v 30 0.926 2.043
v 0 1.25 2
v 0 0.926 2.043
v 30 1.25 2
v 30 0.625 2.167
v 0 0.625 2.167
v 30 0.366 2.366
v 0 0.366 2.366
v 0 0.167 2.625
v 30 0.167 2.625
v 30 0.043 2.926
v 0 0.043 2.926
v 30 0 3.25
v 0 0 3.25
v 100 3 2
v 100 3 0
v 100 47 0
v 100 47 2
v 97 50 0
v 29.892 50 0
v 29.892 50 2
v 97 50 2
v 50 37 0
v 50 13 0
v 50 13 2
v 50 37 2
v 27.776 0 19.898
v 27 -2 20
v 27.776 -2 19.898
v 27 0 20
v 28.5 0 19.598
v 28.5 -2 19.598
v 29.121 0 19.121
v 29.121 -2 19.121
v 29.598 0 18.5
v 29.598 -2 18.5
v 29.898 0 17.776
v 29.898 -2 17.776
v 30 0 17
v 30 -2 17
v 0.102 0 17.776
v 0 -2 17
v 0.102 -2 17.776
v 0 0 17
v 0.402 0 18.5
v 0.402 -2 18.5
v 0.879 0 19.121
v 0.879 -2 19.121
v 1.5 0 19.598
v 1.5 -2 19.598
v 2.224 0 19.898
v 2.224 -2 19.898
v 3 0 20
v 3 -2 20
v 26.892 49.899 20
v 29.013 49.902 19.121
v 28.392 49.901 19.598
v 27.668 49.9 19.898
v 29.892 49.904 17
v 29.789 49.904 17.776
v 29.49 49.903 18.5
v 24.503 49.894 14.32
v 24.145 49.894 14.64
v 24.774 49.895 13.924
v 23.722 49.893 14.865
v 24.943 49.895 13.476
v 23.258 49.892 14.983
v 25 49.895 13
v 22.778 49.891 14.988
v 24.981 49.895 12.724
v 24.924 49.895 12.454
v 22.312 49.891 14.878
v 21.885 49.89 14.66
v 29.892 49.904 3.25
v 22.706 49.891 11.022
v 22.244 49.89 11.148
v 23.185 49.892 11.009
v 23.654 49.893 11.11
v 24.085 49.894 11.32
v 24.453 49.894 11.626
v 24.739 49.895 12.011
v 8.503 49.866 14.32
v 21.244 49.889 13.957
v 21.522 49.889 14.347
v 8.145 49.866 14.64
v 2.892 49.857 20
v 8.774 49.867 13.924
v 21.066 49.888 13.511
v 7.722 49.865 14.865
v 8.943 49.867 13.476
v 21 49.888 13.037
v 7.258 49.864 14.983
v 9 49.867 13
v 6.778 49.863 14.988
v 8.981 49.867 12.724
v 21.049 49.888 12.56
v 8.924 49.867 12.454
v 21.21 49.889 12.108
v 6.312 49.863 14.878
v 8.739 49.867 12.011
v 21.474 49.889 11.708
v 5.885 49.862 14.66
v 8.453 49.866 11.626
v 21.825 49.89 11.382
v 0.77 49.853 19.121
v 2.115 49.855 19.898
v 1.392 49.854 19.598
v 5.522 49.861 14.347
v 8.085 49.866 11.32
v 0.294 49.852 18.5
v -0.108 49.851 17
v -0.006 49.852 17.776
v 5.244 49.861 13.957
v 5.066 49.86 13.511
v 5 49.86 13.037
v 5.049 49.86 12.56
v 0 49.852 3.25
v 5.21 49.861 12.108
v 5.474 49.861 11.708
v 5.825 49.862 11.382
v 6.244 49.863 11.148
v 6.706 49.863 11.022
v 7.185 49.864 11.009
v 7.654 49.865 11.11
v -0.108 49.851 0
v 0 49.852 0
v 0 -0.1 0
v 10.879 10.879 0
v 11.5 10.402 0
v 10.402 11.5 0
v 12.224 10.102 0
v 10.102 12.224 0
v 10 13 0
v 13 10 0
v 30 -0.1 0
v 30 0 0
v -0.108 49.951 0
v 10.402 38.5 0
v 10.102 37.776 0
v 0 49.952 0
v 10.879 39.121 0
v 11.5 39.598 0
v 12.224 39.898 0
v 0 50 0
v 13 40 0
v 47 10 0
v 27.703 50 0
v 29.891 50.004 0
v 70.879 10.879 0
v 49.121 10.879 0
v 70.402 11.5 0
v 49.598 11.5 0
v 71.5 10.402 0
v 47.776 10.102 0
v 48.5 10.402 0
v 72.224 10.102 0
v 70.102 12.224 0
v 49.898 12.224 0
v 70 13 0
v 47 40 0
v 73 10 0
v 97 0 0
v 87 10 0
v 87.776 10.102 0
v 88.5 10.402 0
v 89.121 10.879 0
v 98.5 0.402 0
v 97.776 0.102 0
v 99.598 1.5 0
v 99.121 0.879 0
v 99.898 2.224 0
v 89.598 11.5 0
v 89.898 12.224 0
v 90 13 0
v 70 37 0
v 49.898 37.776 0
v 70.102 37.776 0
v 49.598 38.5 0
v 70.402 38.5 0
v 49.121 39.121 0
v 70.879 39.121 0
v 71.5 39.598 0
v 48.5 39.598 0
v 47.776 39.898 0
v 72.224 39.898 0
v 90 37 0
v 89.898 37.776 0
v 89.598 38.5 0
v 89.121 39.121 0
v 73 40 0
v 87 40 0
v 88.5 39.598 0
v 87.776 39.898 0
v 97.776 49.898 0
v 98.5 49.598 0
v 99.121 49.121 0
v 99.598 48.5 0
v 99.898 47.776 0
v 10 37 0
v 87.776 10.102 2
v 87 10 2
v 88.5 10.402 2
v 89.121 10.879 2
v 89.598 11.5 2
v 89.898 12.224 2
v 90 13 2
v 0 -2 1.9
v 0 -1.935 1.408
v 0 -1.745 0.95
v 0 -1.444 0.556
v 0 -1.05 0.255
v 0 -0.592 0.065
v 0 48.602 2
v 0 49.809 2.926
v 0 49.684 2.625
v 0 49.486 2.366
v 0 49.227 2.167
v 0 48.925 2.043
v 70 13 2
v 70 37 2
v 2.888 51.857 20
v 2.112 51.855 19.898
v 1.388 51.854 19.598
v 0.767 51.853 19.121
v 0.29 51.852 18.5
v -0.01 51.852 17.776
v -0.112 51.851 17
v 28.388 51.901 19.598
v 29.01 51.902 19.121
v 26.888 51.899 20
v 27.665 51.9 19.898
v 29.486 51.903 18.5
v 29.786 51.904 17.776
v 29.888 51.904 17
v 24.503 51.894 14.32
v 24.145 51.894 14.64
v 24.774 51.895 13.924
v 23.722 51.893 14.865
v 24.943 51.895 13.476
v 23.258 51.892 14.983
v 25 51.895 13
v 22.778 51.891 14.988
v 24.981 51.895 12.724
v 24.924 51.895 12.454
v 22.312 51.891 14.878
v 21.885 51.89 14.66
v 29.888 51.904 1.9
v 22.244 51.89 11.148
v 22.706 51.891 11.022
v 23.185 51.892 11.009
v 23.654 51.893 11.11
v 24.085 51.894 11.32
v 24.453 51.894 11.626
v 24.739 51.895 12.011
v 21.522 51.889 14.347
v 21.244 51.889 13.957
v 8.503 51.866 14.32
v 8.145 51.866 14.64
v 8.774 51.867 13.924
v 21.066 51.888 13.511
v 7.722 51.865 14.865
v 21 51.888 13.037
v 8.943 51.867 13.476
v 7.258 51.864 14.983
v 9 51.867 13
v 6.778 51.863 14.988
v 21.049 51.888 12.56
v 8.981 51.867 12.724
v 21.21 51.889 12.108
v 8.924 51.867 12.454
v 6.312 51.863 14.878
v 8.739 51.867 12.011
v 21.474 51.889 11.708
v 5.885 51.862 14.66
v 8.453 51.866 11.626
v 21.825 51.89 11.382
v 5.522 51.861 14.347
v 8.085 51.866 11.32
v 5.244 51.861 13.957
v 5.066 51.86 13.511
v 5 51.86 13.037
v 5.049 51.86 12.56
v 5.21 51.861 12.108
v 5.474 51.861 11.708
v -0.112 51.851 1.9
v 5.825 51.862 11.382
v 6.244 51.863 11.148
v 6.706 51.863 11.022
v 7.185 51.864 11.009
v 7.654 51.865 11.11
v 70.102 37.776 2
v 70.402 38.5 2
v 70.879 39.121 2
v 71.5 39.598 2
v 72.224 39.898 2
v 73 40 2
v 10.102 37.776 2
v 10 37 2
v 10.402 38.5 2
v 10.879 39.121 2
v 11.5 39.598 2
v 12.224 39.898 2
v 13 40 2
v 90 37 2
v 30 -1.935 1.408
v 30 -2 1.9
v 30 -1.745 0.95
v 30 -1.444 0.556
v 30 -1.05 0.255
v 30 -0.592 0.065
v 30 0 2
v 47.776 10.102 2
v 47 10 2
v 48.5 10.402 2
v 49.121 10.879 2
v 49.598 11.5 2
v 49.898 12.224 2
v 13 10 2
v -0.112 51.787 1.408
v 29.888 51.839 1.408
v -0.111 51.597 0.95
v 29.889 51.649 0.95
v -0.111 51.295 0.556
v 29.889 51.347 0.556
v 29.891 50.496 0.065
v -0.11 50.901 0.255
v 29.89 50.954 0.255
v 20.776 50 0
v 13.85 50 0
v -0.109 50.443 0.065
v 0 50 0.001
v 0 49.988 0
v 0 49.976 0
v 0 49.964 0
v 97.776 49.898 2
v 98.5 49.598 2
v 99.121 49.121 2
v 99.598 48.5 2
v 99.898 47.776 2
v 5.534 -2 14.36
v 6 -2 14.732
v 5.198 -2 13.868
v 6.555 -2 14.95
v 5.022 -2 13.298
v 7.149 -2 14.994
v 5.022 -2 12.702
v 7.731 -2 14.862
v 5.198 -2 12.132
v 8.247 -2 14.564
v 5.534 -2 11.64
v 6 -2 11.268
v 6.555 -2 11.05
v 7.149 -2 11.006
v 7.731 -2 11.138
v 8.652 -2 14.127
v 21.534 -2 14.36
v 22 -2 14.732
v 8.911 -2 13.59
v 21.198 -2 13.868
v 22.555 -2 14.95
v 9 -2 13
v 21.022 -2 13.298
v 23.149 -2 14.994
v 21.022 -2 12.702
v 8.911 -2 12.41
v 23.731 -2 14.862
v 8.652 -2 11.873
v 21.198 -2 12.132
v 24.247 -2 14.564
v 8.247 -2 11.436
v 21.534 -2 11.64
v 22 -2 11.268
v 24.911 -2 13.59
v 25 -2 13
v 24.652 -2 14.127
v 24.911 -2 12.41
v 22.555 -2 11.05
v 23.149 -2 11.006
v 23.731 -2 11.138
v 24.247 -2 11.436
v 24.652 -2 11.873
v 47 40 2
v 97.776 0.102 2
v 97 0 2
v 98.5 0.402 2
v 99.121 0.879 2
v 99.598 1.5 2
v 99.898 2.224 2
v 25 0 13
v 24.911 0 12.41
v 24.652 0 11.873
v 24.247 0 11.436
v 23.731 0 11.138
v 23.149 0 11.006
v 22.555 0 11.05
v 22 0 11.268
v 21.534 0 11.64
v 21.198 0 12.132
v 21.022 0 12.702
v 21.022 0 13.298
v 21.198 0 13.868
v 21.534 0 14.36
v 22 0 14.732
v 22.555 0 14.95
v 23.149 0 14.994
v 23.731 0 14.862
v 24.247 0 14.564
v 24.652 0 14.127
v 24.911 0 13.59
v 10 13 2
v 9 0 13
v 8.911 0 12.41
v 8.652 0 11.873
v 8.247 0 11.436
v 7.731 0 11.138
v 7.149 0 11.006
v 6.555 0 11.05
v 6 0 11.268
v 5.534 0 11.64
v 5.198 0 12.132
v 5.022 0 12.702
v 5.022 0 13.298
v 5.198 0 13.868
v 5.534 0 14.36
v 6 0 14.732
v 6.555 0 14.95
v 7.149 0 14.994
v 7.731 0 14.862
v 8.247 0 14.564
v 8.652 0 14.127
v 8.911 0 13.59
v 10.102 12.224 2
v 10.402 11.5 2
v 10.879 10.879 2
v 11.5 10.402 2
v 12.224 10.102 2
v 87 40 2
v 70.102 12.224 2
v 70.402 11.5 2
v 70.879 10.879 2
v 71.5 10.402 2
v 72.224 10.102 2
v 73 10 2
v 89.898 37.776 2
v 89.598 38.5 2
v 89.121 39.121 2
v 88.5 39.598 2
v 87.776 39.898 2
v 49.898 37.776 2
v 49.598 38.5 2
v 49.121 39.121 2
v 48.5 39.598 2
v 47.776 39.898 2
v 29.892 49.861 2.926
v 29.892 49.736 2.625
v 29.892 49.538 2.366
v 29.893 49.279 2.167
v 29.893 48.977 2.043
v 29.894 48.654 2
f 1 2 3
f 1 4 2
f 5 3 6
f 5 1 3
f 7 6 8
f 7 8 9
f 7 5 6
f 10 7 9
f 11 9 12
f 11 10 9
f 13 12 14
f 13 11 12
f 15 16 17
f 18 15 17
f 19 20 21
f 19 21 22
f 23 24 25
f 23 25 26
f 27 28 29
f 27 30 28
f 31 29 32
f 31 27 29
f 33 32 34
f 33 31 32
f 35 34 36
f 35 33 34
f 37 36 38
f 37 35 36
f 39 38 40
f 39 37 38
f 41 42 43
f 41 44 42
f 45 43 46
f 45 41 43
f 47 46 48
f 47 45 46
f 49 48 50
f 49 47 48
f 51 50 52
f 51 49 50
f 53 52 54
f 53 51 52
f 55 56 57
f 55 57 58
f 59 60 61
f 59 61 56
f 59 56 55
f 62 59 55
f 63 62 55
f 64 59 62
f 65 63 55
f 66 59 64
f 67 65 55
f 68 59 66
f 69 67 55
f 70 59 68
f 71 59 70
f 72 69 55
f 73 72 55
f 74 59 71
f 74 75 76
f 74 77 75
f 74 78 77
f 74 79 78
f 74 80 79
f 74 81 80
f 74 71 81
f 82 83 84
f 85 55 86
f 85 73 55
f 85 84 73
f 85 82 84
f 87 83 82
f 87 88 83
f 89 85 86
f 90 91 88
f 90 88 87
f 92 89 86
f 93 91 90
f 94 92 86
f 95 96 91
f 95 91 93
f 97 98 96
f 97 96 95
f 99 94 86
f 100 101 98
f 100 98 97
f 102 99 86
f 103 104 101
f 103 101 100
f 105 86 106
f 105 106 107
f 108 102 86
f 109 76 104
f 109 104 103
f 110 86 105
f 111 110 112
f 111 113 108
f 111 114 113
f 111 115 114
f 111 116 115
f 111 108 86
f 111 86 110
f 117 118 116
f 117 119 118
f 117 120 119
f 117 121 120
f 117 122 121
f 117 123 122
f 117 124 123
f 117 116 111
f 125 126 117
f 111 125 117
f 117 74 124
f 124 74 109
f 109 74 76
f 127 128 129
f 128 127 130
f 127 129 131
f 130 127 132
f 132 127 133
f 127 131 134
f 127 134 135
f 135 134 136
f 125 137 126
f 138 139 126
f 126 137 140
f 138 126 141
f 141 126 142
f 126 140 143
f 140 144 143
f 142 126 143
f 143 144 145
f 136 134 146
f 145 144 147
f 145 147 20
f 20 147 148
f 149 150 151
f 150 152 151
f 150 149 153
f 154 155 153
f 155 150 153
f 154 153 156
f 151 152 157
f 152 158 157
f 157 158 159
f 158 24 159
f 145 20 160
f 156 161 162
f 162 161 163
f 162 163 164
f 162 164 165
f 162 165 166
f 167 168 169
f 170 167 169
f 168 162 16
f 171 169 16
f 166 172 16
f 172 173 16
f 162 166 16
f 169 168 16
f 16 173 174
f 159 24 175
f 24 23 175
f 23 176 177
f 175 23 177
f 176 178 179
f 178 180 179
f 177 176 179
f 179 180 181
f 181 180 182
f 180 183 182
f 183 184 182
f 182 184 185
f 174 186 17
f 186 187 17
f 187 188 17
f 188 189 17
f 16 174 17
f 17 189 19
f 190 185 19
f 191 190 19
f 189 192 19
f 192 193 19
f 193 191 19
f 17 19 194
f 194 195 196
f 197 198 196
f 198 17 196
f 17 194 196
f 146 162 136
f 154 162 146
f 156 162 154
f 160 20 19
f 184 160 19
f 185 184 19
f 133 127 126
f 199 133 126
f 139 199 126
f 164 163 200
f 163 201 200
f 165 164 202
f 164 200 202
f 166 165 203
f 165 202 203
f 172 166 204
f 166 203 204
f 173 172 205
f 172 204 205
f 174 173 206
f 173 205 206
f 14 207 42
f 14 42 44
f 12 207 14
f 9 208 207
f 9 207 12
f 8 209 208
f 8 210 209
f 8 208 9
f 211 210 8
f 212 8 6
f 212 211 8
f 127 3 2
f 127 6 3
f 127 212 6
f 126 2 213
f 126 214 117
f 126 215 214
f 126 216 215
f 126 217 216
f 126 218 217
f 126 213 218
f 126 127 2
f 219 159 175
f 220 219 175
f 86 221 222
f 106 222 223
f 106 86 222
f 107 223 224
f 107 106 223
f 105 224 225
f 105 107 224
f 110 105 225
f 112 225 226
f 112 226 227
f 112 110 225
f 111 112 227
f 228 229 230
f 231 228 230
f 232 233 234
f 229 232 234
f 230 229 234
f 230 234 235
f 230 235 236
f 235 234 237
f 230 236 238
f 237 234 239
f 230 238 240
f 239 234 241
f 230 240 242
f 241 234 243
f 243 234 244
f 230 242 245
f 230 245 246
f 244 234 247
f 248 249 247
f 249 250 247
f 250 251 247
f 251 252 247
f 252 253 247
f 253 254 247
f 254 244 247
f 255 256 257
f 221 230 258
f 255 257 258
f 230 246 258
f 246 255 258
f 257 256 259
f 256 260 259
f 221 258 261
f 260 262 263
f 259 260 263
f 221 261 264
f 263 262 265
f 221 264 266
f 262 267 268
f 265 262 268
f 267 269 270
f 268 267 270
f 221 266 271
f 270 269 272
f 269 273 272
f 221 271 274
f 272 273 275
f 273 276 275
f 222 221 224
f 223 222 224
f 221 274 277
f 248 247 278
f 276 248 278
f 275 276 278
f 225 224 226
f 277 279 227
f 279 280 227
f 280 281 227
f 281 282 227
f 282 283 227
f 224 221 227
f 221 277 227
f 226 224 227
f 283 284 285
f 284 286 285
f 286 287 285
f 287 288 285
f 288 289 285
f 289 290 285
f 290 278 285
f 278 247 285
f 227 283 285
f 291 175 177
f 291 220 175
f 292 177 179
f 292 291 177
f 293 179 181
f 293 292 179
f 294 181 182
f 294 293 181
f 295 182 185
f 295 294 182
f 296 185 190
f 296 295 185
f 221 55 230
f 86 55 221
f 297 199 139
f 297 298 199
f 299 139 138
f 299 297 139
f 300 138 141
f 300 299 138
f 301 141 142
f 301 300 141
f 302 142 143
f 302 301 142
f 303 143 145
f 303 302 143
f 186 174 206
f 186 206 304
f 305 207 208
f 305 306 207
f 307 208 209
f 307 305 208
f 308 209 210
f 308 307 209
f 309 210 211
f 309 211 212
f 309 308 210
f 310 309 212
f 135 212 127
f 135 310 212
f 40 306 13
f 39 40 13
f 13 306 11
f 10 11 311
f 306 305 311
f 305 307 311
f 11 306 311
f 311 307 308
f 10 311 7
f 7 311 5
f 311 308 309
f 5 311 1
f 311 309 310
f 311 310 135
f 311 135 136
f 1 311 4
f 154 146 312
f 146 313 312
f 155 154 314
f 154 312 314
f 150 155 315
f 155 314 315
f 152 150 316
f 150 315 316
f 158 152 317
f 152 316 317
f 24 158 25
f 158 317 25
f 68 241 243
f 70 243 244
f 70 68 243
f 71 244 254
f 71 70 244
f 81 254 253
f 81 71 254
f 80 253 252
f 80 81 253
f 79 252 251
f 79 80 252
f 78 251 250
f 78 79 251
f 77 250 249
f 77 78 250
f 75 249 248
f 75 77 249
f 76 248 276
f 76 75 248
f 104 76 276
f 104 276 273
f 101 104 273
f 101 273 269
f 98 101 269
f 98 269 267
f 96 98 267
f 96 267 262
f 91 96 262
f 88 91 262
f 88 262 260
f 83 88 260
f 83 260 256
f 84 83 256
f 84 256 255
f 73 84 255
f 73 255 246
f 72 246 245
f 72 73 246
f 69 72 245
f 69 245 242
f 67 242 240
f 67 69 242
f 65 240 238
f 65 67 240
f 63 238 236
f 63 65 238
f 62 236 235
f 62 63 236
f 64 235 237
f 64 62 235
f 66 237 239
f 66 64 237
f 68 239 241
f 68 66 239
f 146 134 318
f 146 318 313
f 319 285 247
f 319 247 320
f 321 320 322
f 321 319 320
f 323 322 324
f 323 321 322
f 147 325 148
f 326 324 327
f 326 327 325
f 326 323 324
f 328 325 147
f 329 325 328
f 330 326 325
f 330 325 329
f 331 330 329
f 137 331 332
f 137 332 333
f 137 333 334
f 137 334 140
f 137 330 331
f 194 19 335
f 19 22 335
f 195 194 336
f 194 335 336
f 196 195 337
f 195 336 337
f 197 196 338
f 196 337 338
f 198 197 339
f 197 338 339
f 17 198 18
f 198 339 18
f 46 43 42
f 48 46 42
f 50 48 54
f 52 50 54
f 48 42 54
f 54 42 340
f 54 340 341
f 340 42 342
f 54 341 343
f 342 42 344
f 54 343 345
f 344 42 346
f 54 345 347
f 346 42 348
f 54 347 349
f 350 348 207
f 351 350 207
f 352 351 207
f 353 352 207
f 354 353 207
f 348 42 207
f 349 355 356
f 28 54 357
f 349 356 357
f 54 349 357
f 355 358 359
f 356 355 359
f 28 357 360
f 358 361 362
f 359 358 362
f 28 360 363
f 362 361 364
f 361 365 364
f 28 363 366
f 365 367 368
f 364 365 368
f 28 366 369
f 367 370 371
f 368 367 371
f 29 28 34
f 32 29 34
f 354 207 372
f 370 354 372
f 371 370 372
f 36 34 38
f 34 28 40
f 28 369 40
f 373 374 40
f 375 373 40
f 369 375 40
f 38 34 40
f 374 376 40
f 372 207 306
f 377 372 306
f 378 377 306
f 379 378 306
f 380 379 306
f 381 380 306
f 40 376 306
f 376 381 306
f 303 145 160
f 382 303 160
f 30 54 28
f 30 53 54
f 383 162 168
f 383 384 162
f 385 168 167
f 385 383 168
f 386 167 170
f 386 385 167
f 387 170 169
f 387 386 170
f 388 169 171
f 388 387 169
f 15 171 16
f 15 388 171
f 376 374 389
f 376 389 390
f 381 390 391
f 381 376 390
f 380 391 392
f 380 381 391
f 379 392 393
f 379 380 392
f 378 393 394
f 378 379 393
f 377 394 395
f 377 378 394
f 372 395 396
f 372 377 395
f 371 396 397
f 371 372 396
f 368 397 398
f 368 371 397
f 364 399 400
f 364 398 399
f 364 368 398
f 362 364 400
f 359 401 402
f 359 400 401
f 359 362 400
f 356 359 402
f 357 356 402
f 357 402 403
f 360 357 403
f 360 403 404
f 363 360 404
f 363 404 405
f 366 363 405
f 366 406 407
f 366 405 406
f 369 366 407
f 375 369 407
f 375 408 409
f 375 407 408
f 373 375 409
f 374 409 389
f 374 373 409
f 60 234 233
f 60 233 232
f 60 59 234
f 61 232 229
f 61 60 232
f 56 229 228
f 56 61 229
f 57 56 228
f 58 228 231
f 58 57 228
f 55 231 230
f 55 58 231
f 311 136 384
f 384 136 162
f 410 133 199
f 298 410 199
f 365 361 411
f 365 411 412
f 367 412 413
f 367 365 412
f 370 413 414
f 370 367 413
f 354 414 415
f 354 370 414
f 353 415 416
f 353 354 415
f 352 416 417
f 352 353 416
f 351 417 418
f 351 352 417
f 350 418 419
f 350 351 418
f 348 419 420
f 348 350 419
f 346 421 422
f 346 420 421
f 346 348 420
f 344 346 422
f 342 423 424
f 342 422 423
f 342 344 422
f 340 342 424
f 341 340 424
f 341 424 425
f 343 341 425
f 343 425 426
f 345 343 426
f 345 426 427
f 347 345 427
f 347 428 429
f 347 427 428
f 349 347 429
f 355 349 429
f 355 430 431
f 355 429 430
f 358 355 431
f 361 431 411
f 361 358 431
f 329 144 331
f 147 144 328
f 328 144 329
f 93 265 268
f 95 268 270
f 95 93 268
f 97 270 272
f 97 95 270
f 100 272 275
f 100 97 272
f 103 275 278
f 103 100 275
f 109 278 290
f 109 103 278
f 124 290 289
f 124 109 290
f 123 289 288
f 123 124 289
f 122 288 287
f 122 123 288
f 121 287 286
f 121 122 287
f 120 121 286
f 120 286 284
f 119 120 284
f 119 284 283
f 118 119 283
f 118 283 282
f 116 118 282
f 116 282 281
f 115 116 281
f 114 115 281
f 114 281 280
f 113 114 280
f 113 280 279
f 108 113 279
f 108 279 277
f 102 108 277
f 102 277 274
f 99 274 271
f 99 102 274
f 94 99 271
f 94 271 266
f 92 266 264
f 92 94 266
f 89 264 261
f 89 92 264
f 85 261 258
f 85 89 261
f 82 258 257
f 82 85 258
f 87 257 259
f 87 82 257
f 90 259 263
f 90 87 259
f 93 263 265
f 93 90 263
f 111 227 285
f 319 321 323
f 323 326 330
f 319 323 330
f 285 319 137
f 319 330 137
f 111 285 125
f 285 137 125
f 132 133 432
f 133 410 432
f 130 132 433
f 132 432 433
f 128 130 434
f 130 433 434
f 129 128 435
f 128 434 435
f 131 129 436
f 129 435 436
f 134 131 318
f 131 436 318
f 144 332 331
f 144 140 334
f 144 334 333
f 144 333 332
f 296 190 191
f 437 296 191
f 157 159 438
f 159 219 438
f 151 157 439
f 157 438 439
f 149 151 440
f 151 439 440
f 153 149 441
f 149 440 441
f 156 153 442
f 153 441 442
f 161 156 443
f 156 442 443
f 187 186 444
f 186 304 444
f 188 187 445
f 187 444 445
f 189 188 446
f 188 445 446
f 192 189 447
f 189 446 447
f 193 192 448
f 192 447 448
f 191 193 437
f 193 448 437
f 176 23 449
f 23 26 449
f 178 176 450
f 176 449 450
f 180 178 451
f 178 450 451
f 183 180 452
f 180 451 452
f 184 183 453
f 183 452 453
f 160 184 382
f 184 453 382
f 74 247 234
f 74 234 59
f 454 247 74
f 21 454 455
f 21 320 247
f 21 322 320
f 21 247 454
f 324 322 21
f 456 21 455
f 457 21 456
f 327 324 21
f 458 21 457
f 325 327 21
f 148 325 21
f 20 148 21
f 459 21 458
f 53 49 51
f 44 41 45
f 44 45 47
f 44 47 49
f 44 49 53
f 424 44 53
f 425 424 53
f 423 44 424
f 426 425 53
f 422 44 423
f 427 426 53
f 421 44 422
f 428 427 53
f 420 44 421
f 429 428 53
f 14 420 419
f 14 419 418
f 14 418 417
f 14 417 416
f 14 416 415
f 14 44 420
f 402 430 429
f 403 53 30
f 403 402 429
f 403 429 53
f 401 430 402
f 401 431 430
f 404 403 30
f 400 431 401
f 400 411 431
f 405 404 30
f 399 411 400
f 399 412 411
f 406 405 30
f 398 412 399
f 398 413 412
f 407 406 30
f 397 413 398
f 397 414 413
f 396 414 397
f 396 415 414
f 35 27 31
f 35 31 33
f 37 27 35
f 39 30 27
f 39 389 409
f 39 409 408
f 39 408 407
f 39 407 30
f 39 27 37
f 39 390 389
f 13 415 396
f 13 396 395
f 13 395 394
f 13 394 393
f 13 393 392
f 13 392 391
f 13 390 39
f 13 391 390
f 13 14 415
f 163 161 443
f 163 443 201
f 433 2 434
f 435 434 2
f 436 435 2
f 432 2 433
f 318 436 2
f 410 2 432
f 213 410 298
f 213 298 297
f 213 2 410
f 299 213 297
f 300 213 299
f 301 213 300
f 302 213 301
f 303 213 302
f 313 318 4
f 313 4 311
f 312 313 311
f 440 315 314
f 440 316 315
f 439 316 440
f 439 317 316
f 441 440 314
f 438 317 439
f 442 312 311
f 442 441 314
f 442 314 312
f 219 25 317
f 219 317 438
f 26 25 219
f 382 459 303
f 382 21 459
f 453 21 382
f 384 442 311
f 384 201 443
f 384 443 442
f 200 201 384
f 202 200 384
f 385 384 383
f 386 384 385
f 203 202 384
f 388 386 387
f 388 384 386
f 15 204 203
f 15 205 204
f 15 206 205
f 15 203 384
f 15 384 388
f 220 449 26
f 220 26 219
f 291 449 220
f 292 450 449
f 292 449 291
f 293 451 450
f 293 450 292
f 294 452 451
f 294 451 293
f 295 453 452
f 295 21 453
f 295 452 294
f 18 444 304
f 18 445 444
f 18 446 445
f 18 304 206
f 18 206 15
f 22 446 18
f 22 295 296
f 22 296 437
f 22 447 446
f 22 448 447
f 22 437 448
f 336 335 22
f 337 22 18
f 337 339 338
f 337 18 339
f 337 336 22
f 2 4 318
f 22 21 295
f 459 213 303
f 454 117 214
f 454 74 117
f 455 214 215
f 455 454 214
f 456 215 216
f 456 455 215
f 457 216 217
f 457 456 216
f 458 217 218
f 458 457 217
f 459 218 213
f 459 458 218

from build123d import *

# Parameters (mm, degrees)
CYLINDER_R                = 2
CYLINDER_DEPTH            = 60
CYLINDER001_R             = 2
CYLINDER001_DEPTH         = 60
BOX003_W                  = 30
BOX003_H                  = 2
BOX003_DEPTH              = 20
FILLET002_R               = 1.9
FILLET004_R               = 3
BOX004_W                  = 30
BOX004_H                  = 2
BOX004_DEPTH              = 20
FILLET003_R               = 1.9
FILLET003_PLACEMENT_ANGLE = 180.1
FILLET005_R               = 3
BOX001_W                  = 40
BOX001_H                  = 30
BOX001_DEPTH              = 10
BOX002_W                  = 20
BOX002_H                  = 30
BOX002_DEPTH              = 10
BOX_W                     = 100
BOX_H                     = 50
BOX_DEPTH                 = 2
FILLET_R                  = 3
FILLET001_R               = 3
FILLET006_R               = 1.25


with BuildPart() as cylinder:
    # Cylinder → Cylinder (new body)
    with BuildSketch(Plane(origin=(7, -6, 13), x_dir=(1, 0, 0), z_dir=(0, 1, 0))):
        Circle(CYLINDER_R)
    extrude(amount=CYLINDER_DEPTH)


with BuildPart() as fusion002:
    # Cylinder001 → Cylinder001 (new body)
    with BuildSketch(Plane(origin=(23, -6, 13), x_dir=(1, 0, 0), z_dir=(0, 1, 0))):
        Circle(CYLINDER001_R)
    extrude(amount=CYLINDER001_DEPTH)

    # Fusion002: union Cylinder
    add(cylinder.part)


with BuildPart() as fillet004:
    # Box003 → Box003 (new body)
    with BuildSketch(Plane(origin=(0, -1, 2), x_dir=(1, 0, 0), z_dir=(0, 0, 1))):
        with Locations((15, 1)):
            Rectangle(BOX003_W, BOX003_H)
    extrude(amount=BOX003_DEPTH)

    # Fillet002
    fillet002_edges = [fillet004.edges().sort_by_distance(p)[0] for p in [
        (15, -1, 2),
    ]]
    fillet(fillet002_edges, radius=FILLET002_R)


with BuildPart() as fillet004_1:
    # Fillet002 placement: moved
    add(fillet004.part.moved(Location((0, -1, -2))))

    # Fillet004
    fillet004_edges = [fillet004_1.edges().sort_by_distance(p)[0] for p in [
        (0, -1, 20),
        (30, -1, 20),
    ]]
    fillet(fillet004_edges, radius=FILLET004_R)


with BuildPart() as cut001:
    # Box004 → Box004 (new body)
    with BuildSketch(Plane(origin=(0, -1, 2), x_dir=(1, 0, 0), z_dir=(0, 0, 1))):
        with Locations((15, 1)):
            Rectangle(BOX004_W, BOX004_H)
    extrude(amount=BOX004_DEPTH)

    # Fillet003
    fillet003_edges = [cut001.edges().sort_by_distance(p)[0] for p in [
        (15, -1, 2),
    ]]
    fillet(fillet003_edges, radius=FILLET003_R)


with BuildPart() as cut001_1:
    # Fillet003 placement: moved
    add(cut001.part.moved(Location((29.889927, 50.903819, -2))).rotate(Axis((29.889927, 50.903819, -2), (0, 0, 1)), FILLET003_PLACEMENT_ANGLE))

    # Fillet005
    fillet005_edges = [cut001_1.edges().sort_by_distance(p)[0] for p in [
        (29.889927, 50.903819, 20),
        (-0.110027, 50.851459, 20),
    ]]
    fillet(fillet005_edges, radius=FILLET005_R)

    # Fusion001: union Fillet004
    add(fillet004_1.part)

    # Cut001: cut Fusion002
    add(fusion002.part, mode=Mode.SUBTRACT)


with BuildPart() as cube001:
    # Box001 → Box001 (new body)
    with BuildSketch(Plane(origin=(10, 10, -2), x_dir=(1, 0, 0), z_dir=(0, 0, 1))):
        with Locations((20, 15)):
            Rectangle(BOX001_W, BOX001_H)
    extrude(amount=BOX001_DEPTH)


with BuildPart() as fusion:
    # Box002 → Box002 (new body)
    with BuildSketch(Plane(origin=(70, 10, -2), x_dir=(1, 0, 0), z_dir=(0, 0, 1))):
        with Locations((10, 15)):
            Rectangle(BOX002_W, BOX002_H)
    extrude(amount=BOX002_DEPTH)

    # Fusion: union Cube001
    add(cube001.part)


with BuildPart() as fillet006:
    # Box → Box (new body)
    with BuildSketch(Plane.XY):
        with Locations((50, 25)):
            Rectangle(BOX_W, BOX_H)
    extrude(amount=BOX_DEPTH)

    # Cut: cut Fusion
    add(fusion.part, mode=Mode.SUBTRACT)

    # Fillet
    fillet_edges = [fillet006.edges().sort_by_distance(p)[0] for p in [
        (50, 10, 1),
        (10, 10, 1),
        (50, 40, 1),
        (10, 40, 1),
        (90, 10, 1),
        (70, 10, 1),
        (90, 40, 1),
        (70, 40, 1),
    ]]
    fillet(fillet_edges, radius=FILLET_R)

    # Fillet001
    fillet001_edges = [fillet006.edges().sort_by_distance(p)[0] for p in [
        (100, 50, 1),
        (100, 0, 1),
    ]]
    fillet(fillet001_edges, radius=FILLET001_R)

    # Fusion003: union Cut001
    add(cut001_1.part)

    # Fillet006
    fillet006_edges = [fillet006.edges().sort_by_distance(p)[0] for p in [
        (14.945836, 49.877735, 2),
        (15, 0, 2),
    ]]
    fillet(fillet006_edges, radius=FILLET006_R)


solid = fillet006.part
